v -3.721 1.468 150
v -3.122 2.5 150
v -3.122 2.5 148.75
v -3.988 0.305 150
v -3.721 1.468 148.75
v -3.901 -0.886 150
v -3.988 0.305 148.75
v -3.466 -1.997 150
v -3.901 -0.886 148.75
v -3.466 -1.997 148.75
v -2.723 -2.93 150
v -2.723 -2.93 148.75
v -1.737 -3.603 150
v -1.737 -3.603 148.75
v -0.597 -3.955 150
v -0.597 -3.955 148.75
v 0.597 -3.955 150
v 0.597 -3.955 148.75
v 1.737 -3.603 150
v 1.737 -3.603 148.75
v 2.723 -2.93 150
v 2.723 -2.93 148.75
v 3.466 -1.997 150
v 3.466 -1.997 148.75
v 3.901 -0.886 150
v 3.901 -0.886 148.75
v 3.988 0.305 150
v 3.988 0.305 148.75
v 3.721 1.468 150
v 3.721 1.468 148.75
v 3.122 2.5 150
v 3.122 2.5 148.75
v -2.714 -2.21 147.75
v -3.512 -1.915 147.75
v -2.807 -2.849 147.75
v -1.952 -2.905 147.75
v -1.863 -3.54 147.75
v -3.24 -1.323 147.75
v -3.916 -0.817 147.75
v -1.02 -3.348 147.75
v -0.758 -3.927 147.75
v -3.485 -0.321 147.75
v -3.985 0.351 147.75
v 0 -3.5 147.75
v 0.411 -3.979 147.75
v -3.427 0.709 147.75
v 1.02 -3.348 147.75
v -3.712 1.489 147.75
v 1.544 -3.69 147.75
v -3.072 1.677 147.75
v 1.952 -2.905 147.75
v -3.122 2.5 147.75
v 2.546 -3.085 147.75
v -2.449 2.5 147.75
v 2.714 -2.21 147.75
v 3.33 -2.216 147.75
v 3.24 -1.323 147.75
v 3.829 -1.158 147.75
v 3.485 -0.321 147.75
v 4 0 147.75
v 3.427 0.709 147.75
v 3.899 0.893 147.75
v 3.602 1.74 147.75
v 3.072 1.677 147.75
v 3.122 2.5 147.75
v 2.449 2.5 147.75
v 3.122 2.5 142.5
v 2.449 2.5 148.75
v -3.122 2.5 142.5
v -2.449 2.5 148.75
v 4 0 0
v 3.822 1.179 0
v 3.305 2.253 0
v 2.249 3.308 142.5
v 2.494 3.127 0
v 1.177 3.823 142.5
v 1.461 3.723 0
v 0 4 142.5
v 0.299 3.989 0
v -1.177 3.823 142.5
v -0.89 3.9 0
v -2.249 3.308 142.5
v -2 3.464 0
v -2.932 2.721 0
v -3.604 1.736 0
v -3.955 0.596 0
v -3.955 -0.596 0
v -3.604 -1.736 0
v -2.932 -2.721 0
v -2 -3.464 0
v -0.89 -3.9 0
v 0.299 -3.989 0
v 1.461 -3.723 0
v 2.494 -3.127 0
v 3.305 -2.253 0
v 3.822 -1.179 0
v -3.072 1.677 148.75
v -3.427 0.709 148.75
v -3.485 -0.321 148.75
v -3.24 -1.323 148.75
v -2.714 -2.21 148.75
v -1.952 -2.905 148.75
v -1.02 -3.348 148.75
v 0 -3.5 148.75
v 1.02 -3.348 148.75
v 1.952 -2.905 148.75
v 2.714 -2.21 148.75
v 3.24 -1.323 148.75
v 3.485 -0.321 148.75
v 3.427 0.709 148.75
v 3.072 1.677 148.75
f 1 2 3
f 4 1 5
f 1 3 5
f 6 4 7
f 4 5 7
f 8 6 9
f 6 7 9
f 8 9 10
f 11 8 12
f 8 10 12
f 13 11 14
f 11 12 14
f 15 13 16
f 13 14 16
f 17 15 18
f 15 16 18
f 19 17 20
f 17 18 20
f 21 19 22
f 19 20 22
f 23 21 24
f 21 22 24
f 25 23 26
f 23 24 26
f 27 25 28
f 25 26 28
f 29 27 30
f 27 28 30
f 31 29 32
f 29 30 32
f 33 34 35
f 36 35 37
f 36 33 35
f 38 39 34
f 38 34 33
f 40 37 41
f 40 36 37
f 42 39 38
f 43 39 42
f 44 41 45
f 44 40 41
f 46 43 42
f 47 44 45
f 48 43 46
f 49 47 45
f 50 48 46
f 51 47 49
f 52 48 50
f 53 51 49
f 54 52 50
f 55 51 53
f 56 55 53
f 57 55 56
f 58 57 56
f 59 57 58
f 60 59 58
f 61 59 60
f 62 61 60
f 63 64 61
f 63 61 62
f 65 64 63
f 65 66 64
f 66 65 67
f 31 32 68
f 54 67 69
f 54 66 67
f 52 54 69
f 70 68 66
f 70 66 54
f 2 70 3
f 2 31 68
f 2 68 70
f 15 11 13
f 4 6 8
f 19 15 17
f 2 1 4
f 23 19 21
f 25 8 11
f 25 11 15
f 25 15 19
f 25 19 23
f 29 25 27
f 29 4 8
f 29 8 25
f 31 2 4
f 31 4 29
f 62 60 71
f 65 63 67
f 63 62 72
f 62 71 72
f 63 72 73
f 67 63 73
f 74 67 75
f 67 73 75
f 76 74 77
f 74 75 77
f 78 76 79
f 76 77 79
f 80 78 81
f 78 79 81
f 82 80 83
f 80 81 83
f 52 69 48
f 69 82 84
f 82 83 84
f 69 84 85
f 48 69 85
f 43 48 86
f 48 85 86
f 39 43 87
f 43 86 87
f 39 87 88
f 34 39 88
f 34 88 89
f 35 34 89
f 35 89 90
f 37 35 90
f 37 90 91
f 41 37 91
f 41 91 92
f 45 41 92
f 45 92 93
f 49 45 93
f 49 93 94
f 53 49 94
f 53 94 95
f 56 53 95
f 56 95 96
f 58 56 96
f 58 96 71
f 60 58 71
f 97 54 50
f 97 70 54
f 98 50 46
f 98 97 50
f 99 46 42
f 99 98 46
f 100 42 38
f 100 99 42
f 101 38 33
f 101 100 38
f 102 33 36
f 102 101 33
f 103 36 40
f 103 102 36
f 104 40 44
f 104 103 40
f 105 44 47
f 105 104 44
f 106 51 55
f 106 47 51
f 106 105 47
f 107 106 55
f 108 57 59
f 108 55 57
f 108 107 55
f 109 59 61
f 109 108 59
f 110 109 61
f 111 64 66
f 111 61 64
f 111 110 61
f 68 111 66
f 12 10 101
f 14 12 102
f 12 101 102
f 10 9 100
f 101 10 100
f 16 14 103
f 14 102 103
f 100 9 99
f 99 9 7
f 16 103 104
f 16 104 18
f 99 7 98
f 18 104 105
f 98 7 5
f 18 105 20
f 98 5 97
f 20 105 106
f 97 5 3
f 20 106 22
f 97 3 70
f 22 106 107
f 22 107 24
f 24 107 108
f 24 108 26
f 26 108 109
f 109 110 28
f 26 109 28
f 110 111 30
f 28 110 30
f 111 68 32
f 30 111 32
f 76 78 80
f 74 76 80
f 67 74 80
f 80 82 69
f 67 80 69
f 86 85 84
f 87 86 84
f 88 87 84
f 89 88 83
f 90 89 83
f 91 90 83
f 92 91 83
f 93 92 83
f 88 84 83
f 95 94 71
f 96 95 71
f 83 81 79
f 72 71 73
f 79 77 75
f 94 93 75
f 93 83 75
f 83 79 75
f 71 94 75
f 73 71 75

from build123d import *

# Parameters (mm, degrees)
SKETCH1_R           = 4
BOSS_EXTRUDE1_DEPTH = 150
CUT_EXTRUDE1_DEPTH  = 7.5
SKETCH3_R           = 4
SKETCH3_R_2         = 3.5
CUT_EXTRUDE2_DEPTH  = 1


with BuildPart() as part:
    # Sketch1 → Boss-Extrude1 (new body)
    with BuildSketch(Plane.XY):
        Circle(SKETCH1_R)
    extrude(amount=BOSS_EXTRUDE1_DEPTH)

    # Sketch2 → Cut-Extrude1 (cut)
    with BuildSketch(Plane.XY.offset(150)):
        with BuildLine():
            Line((3.122498999, 2.5), (-3.122498999, 2.5))
            ThreePointArc((-3.122498999, 2.5), (0, 4), (3.122498999, 2.5))
        make_face()
    extrude(amount=-CUT_EXTRUDE1_DEPTH, mode=Mode.SUBTRACT)

    # Sketch3 → Cut-Extrude2 (cut)
    with BuildSketch(Plane.XY.offset(148.75)):
        Circle(SKETCH3_R)
        Circle(SKETCH3_R_2, mode=Mode.SUBTRACT)
    extrude(amount=-CUT_EXTRUDE2_DEPTH, mode=Mode.SUBTRACT)


solid = part.part
